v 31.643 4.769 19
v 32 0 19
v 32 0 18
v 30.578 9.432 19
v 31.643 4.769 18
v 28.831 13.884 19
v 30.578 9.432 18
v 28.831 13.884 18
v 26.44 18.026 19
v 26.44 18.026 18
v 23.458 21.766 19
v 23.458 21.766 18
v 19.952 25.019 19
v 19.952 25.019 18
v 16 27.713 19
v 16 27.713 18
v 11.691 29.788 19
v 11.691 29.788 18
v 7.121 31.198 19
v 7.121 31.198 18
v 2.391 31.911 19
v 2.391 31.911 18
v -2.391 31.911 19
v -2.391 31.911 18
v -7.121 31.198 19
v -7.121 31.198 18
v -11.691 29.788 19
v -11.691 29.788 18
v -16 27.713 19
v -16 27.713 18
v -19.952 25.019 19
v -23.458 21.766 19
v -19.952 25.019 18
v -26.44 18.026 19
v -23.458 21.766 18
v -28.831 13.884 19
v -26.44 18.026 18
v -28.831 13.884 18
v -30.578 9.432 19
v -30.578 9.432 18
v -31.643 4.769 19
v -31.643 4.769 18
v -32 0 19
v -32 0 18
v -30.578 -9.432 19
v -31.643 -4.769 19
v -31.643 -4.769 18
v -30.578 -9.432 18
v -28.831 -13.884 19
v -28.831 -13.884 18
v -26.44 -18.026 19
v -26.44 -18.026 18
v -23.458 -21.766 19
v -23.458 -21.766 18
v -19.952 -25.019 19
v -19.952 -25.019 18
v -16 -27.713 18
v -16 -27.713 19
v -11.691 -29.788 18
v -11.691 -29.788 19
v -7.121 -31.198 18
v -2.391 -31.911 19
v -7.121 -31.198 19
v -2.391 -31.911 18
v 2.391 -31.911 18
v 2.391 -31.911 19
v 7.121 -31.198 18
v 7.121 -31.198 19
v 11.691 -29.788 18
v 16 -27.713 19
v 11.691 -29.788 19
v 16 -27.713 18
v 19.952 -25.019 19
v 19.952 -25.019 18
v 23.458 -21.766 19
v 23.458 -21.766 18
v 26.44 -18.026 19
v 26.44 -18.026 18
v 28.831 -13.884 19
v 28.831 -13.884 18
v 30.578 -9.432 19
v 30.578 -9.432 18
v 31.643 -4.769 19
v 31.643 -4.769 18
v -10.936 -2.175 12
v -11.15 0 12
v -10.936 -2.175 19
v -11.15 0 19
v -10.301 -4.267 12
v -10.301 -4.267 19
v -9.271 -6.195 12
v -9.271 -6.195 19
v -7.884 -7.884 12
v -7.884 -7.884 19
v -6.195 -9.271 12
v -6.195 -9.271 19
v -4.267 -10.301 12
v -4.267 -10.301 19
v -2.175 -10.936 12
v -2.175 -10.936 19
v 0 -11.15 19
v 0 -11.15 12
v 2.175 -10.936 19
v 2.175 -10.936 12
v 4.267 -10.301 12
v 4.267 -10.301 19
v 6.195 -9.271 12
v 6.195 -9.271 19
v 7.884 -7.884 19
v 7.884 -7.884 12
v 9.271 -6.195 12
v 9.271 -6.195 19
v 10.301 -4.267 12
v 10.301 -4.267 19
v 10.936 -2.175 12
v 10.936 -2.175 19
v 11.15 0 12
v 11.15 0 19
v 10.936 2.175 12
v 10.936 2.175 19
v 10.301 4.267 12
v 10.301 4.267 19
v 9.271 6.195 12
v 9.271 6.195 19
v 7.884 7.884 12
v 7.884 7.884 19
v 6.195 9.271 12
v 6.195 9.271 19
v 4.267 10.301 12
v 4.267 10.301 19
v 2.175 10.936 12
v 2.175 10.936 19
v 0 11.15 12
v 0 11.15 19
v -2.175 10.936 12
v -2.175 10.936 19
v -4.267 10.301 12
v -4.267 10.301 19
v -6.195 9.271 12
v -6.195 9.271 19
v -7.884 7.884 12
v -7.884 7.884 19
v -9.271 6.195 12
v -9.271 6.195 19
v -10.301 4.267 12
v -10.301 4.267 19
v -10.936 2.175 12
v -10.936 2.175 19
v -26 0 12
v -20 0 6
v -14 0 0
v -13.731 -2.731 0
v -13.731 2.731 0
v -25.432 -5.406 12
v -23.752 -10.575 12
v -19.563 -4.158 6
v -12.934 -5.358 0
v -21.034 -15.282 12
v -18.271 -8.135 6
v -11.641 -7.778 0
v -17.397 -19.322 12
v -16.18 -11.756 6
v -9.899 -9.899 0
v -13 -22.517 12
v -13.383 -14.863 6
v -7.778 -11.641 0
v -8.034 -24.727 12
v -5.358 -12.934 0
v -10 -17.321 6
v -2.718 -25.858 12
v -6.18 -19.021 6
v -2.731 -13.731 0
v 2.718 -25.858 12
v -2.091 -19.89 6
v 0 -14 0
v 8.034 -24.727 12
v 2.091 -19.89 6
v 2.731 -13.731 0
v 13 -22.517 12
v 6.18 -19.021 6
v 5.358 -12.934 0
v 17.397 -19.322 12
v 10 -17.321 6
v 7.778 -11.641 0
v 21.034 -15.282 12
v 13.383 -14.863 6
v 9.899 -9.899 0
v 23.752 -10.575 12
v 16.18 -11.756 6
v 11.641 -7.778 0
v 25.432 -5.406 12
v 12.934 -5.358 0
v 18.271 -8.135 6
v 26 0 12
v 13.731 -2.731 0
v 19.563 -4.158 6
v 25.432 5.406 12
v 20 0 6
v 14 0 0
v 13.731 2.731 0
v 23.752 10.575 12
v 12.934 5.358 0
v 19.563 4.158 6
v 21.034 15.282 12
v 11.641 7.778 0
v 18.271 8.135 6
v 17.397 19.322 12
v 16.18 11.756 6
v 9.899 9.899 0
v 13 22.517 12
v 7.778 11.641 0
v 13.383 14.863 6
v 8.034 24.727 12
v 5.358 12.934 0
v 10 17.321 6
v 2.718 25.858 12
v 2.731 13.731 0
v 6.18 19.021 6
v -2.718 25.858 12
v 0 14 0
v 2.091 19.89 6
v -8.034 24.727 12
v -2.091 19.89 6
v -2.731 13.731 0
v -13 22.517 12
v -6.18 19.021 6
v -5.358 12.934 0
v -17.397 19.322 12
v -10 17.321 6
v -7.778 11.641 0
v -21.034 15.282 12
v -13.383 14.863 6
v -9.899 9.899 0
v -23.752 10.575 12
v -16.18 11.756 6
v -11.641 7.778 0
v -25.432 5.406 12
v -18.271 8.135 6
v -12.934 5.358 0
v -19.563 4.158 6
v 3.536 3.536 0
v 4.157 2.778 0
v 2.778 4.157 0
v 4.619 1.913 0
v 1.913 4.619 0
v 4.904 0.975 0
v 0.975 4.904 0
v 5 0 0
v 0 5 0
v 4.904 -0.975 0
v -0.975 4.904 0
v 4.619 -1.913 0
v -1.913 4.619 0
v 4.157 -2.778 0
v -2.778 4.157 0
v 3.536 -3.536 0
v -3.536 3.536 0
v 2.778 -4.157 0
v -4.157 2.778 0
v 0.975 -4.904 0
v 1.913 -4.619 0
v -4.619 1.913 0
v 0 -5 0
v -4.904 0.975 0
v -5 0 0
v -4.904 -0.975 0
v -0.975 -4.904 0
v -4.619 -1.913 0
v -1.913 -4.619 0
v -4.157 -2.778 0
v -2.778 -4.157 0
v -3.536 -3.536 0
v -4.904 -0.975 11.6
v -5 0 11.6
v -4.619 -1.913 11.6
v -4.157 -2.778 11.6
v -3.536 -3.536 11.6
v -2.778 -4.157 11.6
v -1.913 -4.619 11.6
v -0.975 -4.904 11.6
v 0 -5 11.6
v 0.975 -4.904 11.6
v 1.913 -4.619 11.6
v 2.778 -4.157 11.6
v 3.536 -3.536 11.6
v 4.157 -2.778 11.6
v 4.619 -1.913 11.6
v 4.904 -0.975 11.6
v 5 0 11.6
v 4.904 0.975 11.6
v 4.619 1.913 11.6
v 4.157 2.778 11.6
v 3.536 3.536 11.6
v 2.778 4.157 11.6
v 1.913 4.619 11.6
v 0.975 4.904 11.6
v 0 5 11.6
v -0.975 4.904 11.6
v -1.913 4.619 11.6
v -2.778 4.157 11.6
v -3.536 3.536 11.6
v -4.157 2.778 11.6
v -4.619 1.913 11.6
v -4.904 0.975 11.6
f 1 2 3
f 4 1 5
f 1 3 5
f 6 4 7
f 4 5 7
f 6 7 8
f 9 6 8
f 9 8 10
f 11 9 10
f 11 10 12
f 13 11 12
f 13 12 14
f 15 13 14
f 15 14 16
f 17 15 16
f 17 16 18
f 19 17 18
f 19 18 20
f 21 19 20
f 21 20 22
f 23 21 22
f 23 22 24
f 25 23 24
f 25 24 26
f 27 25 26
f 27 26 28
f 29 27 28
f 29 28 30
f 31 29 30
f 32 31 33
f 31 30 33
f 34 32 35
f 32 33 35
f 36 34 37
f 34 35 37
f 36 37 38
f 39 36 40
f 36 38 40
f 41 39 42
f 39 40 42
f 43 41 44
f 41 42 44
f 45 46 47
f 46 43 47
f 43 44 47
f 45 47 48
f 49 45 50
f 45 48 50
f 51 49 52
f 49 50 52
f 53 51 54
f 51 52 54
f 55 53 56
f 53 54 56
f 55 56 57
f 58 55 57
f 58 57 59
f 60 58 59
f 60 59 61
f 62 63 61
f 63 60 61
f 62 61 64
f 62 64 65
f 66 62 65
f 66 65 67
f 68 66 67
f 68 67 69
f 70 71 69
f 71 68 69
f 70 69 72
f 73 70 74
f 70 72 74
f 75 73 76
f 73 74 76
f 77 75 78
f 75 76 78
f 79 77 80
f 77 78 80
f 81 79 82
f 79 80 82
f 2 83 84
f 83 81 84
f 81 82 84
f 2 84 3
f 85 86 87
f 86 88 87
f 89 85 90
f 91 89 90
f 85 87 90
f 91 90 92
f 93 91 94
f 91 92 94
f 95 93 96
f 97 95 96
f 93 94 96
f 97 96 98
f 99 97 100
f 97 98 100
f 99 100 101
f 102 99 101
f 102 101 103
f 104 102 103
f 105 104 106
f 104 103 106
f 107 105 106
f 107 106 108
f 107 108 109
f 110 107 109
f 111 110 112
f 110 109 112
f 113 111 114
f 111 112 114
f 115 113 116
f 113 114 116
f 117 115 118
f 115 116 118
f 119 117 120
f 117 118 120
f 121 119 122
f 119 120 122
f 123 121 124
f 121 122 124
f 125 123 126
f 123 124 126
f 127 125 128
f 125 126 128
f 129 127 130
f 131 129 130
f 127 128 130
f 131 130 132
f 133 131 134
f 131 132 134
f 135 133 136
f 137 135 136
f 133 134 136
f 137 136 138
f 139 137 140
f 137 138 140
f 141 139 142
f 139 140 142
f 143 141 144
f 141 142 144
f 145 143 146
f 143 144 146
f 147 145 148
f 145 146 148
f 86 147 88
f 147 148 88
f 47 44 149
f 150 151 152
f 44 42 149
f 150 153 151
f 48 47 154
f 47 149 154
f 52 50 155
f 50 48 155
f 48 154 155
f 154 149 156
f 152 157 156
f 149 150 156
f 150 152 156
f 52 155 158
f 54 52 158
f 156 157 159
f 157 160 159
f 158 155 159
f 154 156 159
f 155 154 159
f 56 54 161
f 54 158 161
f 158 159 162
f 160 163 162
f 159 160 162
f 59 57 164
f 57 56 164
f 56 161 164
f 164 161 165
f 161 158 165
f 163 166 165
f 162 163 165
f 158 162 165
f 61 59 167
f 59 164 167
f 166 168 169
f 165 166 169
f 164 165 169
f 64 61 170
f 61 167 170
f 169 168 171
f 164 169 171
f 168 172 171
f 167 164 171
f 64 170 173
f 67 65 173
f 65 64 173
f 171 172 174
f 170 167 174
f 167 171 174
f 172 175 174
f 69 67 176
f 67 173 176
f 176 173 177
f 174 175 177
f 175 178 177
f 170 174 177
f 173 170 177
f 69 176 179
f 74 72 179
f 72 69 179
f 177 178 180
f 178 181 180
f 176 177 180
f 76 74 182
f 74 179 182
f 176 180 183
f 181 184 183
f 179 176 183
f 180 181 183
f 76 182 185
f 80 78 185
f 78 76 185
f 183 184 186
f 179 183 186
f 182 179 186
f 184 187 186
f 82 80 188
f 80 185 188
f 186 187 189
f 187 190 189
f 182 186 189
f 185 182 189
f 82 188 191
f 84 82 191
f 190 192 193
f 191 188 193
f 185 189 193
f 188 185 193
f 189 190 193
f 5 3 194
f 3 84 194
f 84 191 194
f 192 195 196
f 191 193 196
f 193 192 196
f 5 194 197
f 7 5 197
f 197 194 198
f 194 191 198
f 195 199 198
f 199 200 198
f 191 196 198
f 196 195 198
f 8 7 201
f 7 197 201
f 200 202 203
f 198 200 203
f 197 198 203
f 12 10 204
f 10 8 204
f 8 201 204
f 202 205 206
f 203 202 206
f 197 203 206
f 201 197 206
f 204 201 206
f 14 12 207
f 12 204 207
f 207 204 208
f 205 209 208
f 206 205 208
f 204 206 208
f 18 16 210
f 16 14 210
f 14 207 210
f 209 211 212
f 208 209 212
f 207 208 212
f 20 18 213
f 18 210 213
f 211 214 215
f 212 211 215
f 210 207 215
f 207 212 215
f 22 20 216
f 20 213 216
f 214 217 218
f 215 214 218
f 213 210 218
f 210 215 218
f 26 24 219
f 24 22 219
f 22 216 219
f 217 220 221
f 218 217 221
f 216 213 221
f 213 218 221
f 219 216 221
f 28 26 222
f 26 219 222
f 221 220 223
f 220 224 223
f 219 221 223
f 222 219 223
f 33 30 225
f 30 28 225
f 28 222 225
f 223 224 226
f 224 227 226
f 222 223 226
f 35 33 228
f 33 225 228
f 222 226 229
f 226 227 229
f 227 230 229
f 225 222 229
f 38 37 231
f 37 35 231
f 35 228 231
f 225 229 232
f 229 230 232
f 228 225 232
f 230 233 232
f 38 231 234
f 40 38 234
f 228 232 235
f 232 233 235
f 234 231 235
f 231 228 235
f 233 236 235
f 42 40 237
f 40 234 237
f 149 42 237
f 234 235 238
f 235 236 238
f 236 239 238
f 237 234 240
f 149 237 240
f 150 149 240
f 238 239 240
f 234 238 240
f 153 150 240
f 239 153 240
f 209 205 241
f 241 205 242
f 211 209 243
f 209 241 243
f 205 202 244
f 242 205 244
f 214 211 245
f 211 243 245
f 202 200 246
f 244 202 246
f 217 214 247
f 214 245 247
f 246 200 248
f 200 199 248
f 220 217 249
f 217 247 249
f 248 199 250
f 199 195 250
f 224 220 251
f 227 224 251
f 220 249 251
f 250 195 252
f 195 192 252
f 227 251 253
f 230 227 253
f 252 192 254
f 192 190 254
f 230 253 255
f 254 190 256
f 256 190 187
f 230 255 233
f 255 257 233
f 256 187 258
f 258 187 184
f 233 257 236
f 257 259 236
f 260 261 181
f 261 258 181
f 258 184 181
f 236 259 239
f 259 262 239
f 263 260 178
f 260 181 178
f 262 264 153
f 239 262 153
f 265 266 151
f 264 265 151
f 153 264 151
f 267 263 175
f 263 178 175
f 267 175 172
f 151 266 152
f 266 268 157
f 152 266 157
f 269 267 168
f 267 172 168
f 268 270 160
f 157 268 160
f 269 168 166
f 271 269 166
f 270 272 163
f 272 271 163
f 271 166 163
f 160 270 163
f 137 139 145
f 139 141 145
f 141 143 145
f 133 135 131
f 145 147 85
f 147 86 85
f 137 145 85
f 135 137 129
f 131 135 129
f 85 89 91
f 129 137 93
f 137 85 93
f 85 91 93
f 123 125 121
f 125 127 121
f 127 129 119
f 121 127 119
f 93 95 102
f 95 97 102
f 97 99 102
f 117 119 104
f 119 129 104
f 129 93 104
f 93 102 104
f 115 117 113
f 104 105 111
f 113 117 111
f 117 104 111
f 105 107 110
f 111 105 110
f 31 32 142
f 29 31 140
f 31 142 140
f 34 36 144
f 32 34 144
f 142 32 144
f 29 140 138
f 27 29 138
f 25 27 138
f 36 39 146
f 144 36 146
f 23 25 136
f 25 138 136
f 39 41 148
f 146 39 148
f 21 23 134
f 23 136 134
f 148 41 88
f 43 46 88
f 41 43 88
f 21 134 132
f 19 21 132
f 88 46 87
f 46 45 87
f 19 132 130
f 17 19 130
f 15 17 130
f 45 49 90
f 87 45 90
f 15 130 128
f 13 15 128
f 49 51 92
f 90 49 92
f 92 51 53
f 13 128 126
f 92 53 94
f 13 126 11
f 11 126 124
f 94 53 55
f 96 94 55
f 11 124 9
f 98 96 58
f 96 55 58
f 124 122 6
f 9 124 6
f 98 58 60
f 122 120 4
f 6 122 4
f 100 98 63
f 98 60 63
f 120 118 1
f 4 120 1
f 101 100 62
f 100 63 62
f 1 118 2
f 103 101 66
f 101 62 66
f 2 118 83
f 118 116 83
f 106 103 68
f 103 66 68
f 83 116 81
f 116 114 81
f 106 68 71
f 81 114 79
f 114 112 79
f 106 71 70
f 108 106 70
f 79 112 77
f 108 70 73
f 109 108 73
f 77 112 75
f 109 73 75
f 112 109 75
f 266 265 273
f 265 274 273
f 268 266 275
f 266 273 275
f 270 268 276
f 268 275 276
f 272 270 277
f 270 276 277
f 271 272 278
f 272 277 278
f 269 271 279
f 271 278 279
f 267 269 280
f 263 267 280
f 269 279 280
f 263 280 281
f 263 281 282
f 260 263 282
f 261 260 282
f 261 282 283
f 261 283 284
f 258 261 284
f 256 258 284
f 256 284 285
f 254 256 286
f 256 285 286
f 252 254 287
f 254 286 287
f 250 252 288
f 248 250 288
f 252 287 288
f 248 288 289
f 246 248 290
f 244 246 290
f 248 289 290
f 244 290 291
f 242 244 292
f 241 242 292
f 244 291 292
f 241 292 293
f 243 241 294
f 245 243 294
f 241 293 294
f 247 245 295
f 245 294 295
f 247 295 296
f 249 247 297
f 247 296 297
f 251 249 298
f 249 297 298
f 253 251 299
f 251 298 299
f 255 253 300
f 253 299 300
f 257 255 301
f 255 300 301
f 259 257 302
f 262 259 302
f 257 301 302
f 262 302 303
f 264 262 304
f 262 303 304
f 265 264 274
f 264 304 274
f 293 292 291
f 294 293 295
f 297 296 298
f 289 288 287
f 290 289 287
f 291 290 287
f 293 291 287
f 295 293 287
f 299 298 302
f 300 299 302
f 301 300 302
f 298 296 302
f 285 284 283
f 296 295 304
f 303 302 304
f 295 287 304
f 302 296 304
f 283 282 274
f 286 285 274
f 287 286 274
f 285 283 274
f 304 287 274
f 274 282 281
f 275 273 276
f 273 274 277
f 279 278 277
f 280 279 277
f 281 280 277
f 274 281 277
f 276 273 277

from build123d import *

# Parameters (mm, degrees)
F0_W     = 5
F0_H     = 0.4
F2_R     = 32
F3_DEPTH = 25


with BuildPart() as f1:
    # F0 (on Front) → F1 (revolve)
    with BuildSketch(Plane.XZ):
        Polygon((-14, 0), (-5, 0), (-5, 11.6), (-5, 12), (-11.15, 12), (-11.15, 19), (-33, 19), align=None)
        with Locations((-2.5, 11.8)):
            Rectangle(F0_W, F0_H)
    revolve(axis=Axis((0, 0, 11.8), (0, 0, 1)))


with BuildPart() as f3:
    # F2 (on Top) → F3 (new body)
    with BuildSketch(Plane.XY):
        Circle(F2_R)
    extrude(amount=F3_DEPTH)


with BuildPart() as f1_1:
    add(f1.part)

    # F4: intersect F3
    add(f3.part, mode=Mode.INTERSECT)


solid = f1_1.part
